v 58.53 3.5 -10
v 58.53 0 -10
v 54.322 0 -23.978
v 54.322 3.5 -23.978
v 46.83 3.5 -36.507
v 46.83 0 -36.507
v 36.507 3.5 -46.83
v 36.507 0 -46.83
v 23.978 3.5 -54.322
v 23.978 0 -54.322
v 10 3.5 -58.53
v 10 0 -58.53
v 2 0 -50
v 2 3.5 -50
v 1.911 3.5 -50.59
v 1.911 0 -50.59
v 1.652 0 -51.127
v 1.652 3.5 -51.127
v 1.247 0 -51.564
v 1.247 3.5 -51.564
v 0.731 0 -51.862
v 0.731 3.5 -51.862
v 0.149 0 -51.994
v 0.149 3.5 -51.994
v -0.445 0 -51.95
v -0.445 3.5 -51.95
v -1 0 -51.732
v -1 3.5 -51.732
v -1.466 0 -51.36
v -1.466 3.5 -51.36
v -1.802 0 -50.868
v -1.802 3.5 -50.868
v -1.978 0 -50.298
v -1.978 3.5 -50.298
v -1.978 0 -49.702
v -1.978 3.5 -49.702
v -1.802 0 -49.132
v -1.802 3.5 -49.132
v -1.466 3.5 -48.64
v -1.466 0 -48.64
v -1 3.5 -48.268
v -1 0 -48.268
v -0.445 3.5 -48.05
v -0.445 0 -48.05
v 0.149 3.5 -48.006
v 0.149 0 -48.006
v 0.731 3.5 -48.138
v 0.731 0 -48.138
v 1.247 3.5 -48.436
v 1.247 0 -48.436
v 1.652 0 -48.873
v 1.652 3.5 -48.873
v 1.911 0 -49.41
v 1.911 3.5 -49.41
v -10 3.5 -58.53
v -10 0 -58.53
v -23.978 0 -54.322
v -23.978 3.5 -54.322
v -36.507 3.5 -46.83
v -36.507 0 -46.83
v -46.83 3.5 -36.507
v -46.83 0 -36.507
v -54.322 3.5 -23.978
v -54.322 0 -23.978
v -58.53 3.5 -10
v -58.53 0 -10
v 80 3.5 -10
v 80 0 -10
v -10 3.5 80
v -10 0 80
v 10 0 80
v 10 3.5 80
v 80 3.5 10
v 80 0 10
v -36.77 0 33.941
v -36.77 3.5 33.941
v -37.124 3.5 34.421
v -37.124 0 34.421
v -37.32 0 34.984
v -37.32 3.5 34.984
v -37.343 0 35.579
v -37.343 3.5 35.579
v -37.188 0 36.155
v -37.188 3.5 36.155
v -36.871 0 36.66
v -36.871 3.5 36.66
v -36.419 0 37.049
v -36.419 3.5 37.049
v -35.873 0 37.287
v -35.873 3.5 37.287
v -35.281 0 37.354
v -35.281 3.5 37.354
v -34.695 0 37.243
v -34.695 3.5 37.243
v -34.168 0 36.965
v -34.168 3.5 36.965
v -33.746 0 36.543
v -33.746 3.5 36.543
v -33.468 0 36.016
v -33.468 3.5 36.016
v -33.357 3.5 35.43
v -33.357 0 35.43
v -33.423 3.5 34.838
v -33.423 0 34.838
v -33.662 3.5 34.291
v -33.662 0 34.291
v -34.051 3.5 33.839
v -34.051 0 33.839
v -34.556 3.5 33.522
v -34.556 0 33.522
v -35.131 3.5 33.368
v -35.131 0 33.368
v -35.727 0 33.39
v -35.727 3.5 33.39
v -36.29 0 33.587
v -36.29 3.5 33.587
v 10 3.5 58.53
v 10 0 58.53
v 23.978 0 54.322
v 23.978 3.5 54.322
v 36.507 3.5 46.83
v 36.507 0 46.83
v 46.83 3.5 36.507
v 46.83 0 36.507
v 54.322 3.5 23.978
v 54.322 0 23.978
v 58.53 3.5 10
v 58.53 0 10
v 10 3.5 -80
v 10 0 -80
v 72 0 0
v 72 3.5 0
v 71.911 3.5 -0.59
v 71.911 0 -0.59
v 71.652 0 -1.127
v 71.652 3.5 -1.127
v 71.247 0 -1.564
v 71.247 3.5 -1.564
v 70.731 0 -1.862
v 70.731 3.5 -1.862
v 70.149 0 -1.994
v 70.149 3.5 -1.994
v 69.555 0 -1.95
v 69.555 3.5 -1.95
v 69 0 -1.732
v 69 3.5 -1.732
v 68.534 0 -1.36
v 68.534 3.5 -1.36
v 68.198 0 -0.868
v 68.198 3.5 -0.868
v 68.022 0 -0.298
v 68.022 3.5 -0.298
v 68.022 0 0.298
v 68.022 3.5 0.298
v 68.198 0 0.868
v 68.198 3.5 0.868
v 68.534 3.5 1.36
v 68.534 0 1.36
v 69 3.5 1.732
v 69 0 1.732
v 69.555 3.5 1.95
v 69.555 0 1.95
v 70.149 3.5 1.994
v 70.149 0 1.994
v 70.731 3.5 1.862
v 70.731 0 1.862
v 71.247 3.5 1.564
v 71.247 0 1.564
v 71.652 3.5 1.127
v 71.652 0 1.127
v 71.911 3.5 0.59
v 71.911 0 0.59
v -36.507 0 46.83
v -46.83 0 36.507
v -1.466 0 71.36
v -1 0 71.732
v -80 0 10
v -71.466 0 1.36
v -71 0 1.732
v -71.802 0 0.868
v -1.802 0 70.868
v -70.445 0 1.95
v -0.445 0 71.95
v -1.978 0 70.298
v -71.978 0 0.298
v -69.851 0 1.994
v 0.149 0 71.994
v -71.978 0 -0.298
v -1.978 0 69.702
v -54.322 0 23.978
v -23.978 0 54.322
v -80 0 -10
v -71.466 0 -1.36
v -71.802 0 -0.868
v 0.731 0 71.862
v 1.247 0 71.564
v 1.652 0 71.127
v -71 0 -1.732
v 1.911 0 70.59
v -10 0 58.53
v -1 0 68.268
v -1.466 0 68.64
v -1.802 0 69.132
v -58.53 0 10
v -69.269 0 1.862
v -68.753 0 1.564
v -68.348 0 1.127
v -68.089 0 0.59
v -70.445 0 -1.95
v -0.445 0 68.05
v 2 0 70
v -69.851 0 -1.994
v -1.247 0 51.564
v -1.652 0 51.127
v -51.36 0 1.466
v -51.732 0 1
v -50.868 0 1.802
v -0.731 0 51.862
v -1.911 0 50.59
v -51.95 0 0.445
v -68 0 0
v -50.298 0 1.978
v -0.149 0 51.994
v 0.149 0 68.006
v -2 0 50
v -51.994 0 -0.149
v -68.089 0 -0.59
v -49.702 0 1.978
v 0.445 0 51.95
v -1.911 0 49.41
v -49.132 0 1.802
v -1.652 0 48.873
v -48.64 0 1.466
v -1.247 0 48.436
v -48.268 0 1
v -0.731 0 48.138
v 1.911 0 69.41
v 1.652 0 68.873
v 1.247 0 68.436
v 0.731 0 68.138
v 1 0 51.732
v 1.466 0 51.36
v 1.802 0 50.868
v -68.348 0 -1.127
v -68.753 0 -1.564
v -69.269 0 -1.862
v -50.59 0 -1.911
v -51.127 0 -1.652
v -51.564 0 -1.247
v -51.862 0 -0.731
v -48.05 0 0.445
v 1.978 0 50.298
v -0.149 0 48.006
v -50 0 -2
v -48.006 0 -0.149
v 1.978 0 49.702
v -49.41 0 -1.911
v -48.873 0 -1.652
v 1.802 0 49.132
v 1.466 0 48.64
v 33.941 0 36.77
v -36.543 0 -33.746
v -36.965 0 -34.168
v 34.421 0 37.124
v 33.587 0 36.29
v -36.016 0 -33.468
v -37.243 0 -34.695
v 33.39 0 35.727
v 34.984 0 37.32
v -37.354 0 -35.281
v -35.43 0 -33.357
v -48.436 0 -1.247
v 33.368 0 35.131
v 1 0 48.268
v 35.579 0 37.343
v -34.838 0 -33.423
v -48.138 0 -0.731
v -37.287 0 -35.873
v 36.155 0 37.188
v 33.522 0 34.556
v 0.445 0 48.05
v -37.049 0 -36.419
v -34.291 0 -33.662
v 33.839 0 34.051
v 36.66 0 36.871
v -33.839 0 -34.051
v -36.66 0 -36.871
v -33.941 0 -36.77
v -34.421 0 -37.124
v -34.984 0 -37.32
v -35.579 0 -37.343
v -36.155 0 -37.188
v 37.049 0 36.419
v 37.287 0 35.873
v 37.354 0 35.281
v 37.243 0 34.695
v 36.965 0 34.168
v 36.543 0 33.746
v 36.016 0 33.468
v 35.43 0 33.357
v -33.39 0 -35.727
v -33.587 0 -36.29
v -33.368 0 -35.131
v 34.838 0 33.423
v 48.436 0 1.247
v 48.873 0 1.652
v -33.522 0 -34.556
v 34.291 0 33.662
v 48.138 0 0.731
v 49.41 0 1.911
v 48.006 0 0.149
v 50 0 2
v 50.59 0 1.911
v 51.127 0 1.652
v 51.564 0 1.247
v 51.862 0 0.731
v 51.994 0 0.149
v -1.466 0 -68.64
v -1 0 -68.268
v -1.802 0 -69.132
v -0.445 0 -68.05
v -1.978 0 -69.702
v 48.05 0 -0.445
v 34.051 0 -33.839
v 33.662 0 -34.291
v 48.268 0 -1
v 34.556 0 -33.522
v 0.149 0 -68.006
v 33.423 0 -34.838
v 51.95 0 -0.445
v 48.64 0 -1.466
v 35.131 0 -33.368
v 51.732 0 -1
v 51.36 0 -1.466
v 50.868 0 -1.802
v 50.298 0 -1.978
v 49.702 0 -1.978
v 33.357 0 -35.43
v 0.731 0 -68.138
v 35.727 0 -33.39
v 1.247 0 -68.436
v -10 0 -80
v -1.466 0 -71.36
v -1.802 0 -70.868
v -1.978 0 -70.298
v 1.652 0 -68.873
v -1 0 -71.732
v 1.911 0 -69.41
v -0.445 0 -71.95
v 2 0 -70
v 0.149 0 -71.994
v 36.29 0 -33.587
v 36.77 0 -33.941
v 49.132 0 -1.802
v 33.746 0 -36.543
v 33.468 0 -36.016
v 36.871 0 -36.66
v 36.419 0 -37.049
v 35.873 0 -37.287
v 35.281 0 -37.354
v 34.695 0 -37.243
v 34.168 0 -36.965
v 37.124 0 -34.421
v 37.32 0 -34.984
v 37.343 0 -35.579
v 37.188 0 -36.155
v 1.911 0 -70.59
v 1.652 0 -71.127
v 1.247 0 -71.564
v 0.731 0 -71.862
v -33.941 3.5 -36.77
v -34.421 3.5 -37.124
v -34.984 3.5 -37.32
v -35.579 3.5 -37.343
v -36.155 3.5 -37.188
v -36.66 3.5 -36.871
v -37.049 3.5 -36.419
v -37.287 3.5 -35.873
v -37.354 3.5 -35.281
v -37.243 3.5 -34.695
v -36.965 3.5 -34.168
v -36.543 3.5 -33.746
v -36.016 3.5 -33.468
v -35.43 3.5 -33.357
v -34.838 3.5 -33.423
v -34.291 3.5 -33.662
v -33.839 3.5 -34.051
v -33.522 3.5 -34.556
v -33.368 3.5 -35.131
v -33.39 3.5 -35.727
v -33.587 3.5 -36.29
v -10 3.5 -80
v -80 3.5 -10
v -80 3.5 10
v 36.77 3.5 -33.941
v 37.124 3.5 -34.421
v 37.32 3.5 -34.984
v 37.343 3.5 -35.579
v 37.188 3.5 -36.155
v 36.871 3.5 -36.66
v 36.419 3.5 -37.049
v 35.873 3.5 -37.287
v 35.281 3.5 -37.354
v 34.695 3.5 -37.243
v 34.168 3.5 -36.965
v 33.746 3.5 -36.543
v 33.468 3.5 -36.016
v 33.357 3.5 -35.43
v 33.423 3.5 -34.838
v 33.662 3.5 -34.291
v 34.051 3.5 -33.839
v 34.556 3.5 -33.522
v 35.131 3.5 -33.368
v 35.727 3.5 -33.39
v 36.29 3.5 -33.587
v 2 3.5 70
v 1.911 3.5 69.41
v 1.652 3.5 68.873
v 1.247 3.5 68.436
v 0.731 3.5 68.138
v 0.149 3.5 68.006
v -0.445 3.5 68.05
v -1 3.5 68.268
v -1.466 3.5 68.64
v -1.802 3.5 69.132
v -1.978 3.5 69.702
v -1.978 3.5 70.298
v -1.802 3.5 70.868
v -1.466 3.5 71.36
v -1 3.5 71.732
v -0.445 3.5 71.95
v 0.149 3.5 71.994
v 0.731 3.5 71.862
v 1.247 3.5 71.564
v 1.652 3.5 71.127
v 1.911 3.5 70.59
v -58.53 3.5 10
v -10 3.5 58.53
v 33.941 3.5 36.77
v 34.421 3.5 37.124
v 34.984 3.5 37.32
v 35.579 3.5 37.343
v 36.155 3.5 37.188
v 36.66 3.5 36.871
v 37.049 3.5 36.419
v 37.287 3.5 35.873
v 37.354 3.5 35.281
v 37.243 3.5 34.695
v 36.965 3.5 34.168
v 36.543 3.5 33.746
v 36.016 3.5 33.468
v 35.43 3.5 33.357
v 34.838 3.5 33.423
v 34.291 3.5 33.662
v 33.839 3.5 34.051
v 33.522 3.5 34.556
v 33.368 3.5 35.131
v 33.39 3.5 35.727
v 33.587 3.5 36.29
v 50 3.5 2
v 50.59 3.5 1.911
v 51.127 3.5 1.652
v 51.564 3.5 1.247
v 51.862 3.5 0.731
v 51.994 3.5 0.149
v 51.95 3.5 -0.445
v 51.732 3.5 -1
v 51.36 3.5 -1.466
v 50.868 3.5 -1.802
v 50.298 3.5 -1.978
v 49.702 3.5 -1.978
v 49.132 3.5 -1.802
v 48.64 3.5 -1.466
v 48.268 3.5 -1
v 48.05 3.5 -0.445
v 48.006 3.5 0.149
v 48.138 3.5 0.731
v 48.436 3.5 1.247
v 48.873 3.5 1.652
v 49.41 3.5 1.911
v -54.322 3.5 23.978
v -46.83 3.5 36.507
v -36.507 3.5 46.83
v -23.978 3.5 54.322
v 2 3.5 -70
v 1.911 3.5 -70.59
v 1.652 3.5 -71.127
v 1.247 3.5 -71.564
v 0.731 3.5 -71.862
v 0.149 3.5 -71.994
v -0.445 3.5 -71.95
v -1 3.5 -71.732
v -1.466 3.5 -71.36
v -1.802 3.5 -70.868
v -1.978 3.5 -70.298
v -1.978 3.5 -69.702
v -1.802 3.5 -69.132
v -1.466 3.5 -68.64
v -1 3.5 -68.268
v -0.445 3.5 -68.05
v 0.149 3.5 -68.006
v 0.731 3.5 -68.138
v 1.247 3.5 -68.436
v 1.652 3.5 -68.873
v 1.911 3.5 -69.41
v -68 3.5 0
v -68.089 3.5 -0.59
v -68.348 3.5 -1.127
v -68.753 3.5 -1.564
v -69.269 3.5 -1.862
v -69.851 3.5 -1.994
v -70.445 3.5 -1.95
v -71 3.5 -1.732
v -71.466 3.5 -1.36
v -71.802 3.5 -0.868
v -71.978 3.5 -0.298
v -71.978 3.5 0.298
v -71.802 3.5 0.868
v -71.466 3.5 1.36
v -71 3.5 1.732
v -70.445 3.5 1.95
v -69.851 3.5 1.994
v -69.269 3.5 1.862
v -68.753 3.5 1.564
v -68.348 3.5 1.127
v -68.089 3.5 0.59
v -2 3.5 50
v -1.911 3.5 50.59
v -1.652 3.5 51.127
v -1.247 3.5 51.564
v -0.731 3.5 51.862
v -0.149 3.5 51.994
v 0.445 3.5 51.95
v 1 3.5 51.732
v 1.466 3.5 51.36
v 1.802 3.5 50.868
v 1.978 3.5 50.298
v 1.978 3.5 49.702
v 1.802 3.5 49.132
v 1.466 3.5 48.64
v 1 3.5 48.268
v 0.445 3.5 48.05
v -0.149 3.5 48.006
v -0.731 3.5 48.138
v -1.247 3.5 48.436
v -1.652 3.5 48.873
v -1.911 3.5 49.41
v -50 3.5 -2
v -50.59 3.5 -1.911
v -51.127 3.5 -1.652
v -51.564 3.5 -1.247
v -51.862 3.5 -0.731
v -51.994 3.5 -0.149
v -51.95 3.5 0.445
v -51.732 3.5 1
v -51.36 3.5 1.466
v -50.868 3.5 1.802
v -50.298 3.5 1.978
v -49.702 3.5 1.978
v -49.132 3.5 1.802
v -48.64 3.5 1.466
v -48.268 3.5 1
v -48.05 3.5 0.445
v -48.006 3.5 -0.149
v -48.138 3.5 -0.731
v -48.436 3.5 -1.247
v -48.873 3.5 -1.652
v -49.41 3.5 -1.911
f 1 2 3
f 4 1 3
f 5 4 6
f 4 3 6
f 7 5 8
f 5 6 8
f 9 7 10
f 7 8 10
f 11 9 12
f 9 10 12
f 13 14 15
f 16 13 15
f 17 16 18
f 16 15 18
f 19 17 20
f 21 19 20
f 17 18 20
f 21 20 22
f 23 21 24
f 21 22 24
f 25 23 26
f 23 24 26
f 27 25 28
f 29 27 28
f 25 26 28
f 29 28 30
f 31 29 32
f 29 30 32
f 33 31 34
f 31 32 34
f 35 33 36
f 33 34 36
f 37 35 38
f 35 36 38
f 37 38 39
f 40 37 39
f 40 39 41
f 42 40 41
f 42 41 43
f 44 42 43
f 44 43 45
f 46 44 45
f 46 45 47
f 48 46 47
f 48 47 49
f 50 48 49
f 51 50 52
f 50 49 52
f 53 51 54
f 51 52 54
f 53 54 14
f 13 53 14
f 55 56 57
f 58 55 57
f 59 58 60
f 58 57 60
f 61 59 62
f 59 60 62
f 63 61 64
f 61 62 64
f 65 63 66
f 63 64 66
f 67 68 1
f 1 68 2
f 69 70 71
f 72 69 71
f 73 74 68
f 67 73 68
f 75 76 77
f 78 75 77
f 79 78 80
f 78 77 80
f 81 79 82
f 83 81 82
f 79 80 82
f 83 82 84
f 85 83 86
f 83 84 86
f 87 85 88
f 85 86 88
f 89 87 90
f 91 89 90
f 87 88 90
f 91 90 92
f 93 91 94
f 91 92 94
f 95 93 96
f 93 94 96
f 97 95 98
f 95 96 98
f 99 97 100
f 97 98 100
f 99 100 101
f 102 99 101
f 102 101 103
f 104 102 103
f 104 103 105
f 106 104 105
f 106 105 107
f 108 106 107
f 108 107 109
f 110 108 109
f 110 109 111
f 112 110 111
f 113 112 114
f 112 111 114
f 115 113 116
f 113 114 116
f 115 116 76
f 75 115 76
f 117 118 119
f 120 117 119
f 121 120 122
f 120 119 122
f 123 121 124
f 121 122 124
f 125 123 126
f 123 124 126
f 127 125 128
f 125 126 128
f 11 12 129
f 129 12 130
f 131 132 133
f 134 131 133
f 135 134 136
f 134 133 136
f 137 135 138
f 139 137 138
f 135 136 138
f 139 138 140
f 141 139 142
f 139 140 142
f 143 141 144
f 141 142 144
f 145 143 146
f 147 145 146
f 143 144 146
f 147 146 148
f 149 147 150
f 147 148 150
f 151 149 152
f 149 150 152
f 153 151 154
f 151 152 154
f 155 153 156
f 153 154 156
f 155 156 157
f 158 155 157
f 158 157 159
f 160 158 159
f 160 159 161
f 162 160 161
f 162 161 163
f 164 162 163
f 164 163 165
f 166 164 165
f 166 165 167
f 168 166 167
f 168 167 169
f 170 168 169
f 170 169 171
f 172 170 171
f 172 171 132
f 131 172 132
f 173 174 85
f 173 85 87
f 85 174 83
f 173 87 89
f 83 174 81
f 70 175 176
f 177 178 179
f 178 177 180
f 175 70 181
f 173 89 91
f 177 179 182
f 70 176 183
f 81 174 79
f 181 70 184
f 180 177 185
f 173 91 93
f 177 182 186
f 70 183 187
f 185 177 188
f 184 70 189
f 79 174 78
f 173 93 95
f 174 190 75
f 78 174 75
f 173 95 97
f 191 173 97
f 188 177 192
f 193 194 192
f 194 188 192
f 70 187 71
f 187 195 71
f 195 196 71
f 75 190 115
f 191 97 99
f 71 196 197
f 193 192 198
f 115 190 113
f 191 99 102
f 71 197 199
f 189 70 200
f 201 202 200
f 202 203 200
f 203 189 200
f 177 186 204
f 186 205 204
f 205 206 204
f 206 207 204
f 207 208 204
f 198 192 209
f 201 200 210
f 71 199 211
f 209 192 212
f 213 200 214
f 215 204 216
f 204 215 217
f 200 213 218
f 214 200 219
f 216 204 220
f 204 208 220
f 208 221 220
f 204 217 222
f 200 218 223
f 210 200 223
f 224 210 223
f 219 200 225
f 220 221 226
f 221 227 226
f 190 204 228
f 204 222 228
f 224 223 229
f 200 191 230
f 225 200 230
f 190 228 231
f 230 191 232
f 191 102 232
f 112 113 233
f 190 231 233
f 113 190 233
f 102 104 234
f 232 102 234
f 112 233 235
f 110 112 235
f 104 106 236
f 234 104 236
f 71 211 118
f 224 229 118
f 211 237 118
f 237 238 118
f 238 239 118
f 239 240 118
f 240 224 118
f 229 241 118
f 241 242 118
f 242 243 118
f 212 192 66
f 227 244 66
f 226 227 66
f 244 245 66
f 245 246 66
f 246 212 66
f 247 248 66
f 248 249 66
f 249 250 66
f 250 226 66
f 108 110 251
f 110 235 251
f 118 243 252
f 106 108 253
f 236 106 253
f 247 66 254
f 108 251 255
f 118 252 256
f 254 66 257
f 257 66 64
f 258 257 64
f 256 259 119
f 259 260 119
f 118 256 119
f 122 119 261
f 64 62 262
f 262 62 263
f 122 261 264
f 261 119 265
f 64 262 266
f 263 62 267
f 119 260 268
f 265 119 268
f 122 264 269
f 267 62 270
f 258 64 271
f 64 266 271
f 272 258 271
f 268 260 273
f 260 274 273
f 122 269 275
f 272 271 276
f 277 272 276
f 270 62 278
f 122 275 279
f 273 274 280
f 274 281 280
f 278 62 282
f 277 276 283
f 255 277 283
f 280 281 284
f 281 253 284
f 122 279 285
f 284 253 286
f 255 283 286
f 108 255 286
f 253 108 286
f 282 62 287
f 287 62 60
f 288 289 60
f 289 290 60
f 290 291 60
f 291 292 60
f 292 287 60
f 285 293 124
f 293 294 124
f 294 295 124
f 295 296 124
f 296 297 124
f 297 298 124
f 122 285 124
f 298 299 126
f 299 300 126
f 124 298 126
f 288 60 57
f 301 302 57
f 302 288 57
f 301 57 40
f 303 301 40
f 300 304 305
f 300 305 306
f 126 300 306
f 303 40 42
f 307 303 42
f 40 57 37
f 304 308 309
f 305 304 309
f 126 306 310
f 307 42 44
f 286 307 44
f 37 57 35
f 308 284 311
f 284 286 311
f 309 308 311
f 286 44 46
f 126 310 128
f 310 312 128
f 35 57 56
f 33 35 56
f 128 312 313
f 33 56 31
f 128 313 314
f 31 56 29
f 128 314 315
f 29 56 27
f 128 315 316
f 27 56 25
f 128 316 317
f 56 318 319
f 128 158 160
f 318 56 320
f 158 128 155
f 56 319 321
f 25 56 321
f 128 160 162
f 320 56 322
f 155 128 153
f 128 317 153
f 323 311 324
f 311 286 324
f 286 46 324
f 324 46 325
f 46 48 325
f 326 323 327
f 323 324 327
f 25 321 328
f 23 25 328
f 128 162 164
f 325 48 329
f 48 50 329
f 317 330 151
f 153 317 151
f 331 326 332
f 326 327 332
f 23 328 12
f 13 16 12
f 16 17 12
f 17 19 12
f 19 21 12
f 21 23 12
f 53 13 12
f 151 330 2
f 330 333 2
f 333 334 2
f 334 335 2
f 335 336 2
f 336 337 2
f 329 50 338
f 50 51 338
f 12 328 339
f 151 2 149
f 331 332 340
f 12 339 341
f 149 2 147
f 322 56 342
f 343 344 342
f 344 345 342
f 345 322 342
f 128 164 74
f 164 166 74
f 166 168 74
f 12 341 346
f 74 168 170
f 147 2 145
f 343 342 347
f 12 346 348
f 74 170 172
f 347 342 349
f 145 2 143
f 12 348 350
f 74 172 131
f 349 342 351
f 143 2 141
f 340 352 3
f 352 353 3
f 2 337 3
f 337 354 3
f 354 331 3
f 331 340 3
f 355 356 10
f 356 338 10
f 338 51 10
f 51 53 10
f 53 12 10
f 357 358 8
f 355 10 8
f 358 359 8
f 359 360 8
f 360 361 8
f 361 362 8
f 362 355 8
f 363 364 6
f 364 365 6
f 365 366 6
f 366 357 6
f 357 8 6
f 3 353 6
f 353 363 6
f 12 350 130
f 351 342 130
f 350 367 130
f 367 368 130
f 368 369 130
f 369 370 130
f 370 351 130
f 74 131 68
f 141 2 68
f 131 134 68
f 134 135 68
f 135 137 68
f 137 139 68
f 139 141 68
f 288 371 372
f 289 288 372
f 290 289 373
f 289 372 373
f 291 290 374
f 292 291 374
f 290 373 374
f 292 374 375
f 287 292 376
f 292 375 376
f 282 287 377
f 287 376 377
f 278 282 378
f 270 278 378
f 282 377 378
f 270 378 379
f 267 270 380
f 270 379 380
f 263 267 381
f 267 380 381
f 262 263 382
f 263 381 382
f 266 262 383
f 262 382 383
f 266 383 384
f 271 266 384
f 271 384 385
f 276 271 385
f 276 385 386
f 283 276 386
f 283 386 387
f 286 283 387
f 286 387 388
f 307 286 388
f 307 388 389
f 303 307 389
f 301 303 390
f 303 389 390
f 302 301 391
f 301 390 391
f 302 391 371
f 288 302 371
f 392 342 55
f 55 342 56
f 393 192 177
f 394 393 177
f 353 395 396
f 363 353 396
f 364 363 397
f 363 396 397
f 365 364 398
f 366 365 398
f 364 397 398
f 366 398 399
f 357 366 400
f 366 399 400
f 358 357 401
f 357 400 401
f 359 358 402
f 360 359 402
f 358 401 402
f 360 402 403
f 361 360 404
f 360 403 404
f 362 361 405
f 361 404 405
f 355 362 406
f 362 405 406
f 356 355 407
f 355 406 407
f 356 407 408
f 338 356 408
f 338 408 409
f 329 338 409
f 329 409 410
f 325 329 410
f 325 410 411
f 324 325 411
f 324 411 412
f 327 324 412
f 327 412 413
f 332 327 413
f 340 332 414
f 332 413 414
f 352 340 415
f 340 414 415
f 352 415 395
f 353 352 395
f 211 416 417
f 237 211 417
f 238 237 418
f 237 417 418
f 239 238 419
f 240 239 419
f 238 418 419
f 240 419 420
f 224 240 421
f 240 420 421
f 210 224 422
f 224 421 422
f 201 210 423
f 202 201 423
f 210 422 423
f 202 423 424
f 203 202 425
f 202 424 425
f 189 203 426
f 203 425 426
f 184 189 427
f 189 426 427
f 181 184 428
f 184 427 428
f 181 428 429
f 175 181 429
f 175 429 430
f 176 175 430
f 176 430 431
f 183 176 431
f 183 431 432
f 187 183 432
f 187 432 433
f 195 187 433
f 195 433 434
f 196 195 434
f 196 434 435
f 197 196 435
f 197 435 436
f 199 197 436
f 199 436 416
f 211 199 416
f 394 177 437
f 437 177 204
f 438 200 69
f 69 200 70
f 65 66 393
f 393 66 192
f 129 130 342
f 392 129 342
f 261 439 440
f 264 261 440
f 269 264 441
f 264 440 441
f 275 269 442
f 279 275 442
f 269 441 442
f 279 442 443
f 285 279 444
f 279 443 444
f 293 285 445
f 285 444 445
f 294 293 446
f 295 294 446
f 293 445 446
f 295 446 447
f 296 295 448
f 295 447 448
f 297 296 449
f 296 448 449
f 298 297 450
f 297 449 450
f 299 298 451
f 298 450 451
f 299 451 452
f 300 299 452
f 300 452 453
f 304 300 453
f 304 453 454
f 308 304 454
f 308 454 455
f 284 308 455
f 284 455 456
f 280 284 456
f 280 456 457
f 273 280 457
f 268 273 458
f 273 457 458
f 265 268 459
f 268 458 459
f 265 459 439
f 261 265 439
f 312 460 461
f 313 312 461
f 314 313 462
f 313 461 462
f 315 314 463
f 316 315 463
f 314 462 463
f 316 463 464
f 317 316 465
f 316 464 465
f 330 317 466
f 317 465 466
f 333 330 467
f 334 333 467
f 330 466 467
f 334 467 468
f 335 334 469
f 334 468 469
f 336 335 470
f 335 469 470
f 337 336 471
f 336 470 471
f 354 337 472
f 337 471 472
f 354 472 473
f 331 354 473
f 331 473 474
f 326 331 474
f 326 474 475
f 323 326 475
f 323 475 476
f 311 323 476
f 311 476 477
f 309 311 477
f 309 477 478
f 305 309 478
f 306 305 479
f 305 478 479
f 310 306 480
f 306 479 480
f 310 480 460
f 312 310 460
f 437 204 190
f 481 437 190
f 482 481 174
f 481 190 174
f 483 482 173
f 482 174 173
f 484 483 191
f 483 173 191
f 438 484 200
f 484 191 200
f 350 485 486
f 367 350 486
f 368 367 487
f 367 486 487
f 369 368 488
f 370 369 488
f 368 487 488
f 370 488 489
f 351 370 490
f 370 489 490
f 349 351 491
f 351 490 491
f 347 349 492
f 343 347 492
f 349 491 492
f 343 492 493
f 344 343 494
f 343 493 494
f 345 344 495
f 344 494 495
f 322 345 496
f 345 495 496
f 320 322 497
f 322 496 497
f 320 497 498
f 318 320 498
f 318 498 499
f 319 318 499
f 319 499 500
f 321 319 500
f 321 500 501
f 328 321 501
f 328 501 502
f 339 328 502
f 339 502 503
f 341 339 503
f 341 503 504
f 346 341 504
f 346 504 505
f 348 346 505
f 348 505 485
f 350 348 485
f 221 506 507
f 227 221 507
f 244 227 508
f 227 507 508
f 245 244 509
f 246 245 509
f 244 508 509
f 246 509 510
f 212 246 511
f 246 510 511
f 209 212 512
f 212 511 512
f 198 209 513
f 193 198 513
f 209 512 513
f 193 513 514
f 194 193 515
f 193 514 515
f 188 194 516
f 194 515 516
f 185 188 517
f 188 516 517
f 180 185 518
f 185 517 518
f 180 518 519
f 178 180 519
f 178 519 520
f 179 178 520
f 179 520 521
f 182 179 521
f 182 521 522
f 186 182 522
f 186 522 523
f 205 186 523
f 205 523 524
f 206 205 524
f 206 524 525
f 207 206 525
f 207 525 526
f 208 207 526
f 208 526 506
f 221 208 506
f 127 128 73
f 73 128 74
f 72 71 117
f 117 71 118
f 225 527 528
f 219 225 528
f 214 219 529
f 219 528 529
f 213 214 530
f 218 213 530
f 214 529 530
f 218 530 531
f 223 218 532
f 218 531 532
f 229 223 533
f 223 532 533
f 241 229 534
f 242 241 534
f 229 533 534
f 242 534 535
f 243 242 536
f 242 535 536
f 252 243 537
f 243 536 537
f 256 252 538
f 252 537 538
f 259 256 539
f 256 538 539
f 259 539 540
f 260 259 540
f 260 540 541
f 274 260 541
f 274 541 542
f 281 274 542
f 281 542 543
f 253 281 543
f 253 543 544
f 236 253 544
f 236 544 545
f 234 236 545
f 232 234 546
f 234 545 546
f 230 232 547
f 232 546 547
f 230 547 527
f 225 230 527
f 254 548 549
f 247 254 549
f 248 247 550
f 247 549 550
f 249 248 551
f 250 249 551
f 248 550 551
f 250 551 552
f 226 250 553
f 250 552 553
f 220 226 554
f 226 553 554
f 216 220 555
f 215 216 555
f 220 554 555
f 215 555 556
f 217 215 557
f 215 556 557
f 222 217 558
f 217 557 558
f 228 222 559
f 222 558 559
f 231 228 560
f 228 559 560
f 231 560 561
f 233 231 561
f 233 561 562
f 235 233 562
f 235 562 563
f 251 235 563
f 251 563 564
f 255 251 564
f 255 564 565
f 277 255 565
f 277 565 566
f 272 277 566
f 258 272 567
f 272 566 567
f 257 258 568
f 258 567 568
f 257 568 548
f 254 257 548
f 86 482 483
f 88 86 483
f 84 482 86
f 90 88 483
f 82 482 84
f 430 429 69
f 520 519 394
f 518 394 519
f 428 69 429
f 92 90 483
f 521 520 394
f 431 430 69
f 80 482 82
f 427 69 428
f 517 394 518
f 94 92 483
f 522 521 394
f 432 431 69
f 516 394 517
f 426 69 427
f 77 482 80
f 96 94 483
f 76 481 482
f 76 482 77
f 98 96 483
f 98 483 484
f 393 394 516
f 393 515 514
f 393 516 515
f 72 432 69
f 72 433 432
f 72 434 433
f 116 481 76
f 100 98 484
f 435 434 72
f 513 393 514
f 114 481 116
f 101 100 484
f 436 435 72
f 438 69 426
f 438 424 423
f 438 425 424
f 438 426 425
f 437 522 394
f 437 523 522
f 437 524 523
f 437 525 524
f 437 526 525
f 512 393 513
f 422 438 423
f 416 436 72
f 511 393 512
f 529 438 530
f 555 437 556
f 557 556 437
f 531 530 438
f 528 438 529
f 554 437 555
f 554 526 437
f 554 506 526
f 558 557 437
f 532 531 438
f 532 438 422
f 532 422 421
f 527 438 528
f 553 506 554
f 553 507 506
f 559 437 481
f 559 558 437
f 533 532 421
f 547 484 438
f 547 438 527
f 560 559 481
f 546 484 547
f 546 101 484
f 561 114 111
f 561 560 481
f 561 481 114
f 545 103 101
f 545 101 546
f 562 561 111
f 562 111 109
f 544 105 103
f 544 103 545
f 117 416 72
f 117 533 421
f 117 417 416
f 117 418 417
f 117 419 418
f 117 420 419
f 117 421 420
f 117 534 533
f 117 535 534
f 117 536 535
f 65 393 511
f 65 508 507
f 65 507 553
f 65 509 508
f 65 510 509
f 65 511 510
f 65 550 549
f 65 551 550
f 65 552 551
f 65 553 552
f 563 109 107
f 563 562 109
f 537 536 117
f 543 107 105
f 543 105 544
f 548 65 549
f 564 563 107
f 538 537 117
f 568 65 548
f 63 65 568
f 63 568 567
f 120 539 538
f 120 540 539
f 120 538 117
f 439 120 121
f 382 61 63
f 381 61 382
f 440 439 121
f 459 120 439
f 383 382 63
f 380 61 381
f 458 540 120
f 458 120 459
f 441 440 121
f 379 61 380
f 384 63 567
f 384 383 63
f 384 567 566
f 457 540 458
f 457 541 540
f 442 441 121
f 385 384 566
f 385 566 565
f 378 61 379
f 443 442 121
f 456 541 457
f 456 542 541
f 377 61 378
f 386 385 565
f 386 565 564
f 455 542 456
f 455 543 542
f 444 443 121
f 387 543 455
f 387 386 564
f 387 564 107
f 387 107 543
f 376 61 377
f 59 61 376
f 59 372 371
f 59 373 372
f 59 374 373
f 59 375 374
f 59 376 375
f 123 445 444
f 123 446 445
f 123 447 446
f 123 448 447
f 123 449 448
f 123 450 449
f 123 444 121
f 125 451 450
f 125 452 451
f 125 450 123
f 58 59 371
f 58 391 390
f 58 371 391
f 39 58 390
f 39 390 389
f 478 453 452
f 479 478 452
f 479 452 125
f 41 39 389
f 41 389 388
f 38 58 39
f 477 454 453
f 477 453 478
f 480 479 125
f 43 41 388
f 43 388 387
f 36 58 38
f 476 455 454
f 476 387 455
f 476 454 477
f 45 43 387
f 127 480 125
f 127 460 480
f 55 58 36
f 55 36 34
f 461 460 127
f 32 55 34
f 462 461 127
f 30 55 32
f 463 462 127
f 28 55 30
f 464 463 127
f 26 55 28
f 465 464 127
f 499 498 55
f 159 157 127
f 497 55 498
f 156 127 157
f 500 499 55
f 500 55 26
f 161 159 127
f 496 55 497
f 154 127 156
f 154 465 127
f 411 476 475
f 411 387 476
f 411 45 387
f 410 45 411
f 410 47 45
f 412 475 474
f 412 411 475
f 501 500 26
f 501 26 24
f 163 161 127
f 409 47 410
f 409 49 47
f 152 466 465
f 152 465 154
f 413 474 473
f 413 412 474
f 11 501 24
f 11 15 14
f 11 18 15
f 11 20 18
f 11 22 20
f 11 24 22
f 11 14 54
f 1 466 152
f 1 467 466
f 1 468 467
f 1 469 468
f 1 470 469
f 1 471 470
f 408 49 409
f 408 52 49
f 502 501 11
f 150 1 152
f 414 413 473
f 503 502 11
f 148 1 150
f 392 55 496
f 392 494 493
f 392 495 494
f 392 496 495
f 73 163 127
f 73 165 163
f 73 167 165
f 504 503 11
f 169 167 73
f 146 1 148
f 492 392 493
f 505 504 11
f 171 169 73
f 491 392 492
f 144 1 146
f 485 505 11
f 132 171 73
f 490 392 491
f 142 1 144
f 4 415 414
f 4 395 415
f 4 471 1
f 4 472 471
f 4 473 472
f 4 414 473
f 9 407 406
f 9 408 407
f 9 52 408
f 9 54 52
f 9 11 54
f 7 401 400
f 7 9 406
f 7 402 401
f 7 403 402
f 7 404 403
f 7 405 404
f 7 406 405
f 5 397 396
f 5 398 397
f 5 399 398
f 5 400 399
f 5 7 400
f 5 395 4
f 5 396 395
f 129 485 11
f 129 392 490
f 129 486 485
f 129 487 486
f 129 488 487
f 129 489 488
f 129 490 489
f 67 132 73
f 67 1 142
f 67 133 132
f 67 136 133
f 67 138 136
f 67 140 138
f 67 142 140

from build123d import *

# Parameters (mm, degrees)
SALIENTE_EXTRUIR1_DEPTH = 3.5
CROQUIS2_R              = 2
CORTAR_EXTRUIR1_DEPTH   = 3.5
MATRIZC1_COUNT          = 8
CORTAR_EXTRUIR2_REACH   = 5.5
CROQUIS4_R              = 2


with BuildPart() as part:
    # Croquis1 → Saliente-Extruir1 (new body)
    with BuildSketch(Plane(origin=(0, 0, 0), x_dir=(1, 0, 0), z_dir=(0, 1, 0))):
        with BuildLine():
            Line((-10, -58.530413525), (-10, -80))
            Line((-10, -80), (10, -80))
            Line((10, -80), (10, -58.530413525))
            ThreePointArc((10, -58.530413525), (41.986958138, -41.986958138), (58.530413525, -10))
            Line((58.530413525, -10), (80, -10))
            Line((80, -10), (80, 10))
            Line((80, 10), (58.530413525, 10))
            ThreePointArc((58.530413525, 10), (41.986958138, 41.986958138), (10, 58.530413525))
            Line((10, 58.530413525), (10, 80))
            Line((10, 80), (-10, 80))
            Line((-10, 80), (-10, 58.530413525))
            ThreePointArc((-10, 58.530413525), (-41.986958138, 41.986958138), (-58.530413525, 10))
            Line((-58.530413525, 10), (-80, 10))
            Line((-80, 10), (-80, -10))
            Line((-80, -10), (-58.530413525, -10))
            ThreePointArc((-58.530413525, -10), (-41.986958138, -41.986958138), (-10, -58.530413525))
        make_face()
    extrude(amount=SALIENTE_EXTRUIR1_DEPTH)

    # Croquis2 → Cortar-Extruir1 (cut)
    with BuildSketch(Plane(origin=(0, 3.5, 0), x_dir=(1, 0, 0), z_dir=(0, 1, 0))):
        with Locations((0, 50)):
            Circle(CROQUIS2_R)
    cortar_extruir1 = extrude(amount=-CORTAR_EXTRUIR1_DEPTH, mode=Mode.SUBTRACT)

    # MatrizC1: Cortar-Extruir1 ×8 about axis
    matrizc1_axis = Axis((0, 0, 0), (0, 1, 0))
    for i in range(1, MATRIZC1_COUNT):
        add(cortar_extruir1.rotate(matrizc1_axis, i * 360 / MATRIZC1_COUNT), mode=Mode.SUBTRACT)

    # Croquis4 → Cortar-Extruir2 (cut, up to next)
    with BuildSketch(Plane(origin=(0, 3.5, 0), x_dir=(1, 0, 0), z_dir=(0, 1, 0)), mode=Mode.PRIVATE) as cortar_extruir2_sk1:
        with Locations((0, 70)):
            Circle(CROQUIS4_R)
    cortar_extruir2_tool1 = extrude(cortar_extruir2_sk1.sketch, amount=-CORTAR_EXTRUIR2_REACH, mode=Mode.PRIVATE) & part.part
    add(cortar_extruir2_tool1.solids().sort_by_distance((0, 3.5, -70))[0], mode=Mode.SUBTRACT)
    # Croquis4 → Cortar-Extruir2 (cut, up to next)
    with BuildSketch(Plane(origin=(0, 3.5, 0), x_dir=(1, 0, 0), z_dir=(0, 1, 0)), mode=Mode.PRIVATE) as cortar_extruir2_sk2:
        with Locations((70, 0)):
            Circle(CROQUIS4_R)
    cortar_extruir2_tool2 = extrude(cortar_extruir2_sk2.sketch, amount=-CORTAR_EXTRUIR2_REACH, mode=Mode.PRIVATE) & part.part
    add(cortar_extruir2_tool2.solids().sort_by_distance((70, 3.5, 0))[0], mode=Mode.SUBTRACT)
    # Croquis4 → Cortar-Extruir2 (cut, up to next)
    with BuildSketch(Plane(origin=(0, 3.5, 0), x_dir=(1, 0, 0), z_dir=(0, 1, 0)), mode=Mode.PRIVATE) as cortar_extruir2_sk3:
        with Locations((0, -70)):
            Circle(CROQUIS4_R)
    cortar_extruir2_tool3 = extrude(cortar_extruir2_sk3.sketch, amount=-CORTAR_EXTRUIR2_REACH, mode=Mode.PRIVATE) & part.part
    add(cortar_extruir2_tool3.solids().sort_by_distance((0, 3.5, 70))[0], mode=Mode.SUBTRACT)
    # Croquis4 → Cortar-Extruir2 (cut, up to next)
    with BuildSketch(Plane(origin=(0, 3.5, 0), x_dir=(1, 0, 0), z_dir=(0, 1, 0)), mode=Mode.PRIVATE) as cortar_extruir2_sk4:
        with Locations((-70, 0)):
            Circle(CROQUIS4_R)
    cortar_extruir2_tool4 = extrude(cortar_extruir2_sk4.sketch, amount=-CORTAR_EXTRUIR2_REACH, mode=Mode.PRIVATE) & part.part
    add(cortar_extruir2_tool4.solids().sort_by_distance((-70, 3.5, 0))[0], mode=Mode.SUBTRACT)


solid = part.part
